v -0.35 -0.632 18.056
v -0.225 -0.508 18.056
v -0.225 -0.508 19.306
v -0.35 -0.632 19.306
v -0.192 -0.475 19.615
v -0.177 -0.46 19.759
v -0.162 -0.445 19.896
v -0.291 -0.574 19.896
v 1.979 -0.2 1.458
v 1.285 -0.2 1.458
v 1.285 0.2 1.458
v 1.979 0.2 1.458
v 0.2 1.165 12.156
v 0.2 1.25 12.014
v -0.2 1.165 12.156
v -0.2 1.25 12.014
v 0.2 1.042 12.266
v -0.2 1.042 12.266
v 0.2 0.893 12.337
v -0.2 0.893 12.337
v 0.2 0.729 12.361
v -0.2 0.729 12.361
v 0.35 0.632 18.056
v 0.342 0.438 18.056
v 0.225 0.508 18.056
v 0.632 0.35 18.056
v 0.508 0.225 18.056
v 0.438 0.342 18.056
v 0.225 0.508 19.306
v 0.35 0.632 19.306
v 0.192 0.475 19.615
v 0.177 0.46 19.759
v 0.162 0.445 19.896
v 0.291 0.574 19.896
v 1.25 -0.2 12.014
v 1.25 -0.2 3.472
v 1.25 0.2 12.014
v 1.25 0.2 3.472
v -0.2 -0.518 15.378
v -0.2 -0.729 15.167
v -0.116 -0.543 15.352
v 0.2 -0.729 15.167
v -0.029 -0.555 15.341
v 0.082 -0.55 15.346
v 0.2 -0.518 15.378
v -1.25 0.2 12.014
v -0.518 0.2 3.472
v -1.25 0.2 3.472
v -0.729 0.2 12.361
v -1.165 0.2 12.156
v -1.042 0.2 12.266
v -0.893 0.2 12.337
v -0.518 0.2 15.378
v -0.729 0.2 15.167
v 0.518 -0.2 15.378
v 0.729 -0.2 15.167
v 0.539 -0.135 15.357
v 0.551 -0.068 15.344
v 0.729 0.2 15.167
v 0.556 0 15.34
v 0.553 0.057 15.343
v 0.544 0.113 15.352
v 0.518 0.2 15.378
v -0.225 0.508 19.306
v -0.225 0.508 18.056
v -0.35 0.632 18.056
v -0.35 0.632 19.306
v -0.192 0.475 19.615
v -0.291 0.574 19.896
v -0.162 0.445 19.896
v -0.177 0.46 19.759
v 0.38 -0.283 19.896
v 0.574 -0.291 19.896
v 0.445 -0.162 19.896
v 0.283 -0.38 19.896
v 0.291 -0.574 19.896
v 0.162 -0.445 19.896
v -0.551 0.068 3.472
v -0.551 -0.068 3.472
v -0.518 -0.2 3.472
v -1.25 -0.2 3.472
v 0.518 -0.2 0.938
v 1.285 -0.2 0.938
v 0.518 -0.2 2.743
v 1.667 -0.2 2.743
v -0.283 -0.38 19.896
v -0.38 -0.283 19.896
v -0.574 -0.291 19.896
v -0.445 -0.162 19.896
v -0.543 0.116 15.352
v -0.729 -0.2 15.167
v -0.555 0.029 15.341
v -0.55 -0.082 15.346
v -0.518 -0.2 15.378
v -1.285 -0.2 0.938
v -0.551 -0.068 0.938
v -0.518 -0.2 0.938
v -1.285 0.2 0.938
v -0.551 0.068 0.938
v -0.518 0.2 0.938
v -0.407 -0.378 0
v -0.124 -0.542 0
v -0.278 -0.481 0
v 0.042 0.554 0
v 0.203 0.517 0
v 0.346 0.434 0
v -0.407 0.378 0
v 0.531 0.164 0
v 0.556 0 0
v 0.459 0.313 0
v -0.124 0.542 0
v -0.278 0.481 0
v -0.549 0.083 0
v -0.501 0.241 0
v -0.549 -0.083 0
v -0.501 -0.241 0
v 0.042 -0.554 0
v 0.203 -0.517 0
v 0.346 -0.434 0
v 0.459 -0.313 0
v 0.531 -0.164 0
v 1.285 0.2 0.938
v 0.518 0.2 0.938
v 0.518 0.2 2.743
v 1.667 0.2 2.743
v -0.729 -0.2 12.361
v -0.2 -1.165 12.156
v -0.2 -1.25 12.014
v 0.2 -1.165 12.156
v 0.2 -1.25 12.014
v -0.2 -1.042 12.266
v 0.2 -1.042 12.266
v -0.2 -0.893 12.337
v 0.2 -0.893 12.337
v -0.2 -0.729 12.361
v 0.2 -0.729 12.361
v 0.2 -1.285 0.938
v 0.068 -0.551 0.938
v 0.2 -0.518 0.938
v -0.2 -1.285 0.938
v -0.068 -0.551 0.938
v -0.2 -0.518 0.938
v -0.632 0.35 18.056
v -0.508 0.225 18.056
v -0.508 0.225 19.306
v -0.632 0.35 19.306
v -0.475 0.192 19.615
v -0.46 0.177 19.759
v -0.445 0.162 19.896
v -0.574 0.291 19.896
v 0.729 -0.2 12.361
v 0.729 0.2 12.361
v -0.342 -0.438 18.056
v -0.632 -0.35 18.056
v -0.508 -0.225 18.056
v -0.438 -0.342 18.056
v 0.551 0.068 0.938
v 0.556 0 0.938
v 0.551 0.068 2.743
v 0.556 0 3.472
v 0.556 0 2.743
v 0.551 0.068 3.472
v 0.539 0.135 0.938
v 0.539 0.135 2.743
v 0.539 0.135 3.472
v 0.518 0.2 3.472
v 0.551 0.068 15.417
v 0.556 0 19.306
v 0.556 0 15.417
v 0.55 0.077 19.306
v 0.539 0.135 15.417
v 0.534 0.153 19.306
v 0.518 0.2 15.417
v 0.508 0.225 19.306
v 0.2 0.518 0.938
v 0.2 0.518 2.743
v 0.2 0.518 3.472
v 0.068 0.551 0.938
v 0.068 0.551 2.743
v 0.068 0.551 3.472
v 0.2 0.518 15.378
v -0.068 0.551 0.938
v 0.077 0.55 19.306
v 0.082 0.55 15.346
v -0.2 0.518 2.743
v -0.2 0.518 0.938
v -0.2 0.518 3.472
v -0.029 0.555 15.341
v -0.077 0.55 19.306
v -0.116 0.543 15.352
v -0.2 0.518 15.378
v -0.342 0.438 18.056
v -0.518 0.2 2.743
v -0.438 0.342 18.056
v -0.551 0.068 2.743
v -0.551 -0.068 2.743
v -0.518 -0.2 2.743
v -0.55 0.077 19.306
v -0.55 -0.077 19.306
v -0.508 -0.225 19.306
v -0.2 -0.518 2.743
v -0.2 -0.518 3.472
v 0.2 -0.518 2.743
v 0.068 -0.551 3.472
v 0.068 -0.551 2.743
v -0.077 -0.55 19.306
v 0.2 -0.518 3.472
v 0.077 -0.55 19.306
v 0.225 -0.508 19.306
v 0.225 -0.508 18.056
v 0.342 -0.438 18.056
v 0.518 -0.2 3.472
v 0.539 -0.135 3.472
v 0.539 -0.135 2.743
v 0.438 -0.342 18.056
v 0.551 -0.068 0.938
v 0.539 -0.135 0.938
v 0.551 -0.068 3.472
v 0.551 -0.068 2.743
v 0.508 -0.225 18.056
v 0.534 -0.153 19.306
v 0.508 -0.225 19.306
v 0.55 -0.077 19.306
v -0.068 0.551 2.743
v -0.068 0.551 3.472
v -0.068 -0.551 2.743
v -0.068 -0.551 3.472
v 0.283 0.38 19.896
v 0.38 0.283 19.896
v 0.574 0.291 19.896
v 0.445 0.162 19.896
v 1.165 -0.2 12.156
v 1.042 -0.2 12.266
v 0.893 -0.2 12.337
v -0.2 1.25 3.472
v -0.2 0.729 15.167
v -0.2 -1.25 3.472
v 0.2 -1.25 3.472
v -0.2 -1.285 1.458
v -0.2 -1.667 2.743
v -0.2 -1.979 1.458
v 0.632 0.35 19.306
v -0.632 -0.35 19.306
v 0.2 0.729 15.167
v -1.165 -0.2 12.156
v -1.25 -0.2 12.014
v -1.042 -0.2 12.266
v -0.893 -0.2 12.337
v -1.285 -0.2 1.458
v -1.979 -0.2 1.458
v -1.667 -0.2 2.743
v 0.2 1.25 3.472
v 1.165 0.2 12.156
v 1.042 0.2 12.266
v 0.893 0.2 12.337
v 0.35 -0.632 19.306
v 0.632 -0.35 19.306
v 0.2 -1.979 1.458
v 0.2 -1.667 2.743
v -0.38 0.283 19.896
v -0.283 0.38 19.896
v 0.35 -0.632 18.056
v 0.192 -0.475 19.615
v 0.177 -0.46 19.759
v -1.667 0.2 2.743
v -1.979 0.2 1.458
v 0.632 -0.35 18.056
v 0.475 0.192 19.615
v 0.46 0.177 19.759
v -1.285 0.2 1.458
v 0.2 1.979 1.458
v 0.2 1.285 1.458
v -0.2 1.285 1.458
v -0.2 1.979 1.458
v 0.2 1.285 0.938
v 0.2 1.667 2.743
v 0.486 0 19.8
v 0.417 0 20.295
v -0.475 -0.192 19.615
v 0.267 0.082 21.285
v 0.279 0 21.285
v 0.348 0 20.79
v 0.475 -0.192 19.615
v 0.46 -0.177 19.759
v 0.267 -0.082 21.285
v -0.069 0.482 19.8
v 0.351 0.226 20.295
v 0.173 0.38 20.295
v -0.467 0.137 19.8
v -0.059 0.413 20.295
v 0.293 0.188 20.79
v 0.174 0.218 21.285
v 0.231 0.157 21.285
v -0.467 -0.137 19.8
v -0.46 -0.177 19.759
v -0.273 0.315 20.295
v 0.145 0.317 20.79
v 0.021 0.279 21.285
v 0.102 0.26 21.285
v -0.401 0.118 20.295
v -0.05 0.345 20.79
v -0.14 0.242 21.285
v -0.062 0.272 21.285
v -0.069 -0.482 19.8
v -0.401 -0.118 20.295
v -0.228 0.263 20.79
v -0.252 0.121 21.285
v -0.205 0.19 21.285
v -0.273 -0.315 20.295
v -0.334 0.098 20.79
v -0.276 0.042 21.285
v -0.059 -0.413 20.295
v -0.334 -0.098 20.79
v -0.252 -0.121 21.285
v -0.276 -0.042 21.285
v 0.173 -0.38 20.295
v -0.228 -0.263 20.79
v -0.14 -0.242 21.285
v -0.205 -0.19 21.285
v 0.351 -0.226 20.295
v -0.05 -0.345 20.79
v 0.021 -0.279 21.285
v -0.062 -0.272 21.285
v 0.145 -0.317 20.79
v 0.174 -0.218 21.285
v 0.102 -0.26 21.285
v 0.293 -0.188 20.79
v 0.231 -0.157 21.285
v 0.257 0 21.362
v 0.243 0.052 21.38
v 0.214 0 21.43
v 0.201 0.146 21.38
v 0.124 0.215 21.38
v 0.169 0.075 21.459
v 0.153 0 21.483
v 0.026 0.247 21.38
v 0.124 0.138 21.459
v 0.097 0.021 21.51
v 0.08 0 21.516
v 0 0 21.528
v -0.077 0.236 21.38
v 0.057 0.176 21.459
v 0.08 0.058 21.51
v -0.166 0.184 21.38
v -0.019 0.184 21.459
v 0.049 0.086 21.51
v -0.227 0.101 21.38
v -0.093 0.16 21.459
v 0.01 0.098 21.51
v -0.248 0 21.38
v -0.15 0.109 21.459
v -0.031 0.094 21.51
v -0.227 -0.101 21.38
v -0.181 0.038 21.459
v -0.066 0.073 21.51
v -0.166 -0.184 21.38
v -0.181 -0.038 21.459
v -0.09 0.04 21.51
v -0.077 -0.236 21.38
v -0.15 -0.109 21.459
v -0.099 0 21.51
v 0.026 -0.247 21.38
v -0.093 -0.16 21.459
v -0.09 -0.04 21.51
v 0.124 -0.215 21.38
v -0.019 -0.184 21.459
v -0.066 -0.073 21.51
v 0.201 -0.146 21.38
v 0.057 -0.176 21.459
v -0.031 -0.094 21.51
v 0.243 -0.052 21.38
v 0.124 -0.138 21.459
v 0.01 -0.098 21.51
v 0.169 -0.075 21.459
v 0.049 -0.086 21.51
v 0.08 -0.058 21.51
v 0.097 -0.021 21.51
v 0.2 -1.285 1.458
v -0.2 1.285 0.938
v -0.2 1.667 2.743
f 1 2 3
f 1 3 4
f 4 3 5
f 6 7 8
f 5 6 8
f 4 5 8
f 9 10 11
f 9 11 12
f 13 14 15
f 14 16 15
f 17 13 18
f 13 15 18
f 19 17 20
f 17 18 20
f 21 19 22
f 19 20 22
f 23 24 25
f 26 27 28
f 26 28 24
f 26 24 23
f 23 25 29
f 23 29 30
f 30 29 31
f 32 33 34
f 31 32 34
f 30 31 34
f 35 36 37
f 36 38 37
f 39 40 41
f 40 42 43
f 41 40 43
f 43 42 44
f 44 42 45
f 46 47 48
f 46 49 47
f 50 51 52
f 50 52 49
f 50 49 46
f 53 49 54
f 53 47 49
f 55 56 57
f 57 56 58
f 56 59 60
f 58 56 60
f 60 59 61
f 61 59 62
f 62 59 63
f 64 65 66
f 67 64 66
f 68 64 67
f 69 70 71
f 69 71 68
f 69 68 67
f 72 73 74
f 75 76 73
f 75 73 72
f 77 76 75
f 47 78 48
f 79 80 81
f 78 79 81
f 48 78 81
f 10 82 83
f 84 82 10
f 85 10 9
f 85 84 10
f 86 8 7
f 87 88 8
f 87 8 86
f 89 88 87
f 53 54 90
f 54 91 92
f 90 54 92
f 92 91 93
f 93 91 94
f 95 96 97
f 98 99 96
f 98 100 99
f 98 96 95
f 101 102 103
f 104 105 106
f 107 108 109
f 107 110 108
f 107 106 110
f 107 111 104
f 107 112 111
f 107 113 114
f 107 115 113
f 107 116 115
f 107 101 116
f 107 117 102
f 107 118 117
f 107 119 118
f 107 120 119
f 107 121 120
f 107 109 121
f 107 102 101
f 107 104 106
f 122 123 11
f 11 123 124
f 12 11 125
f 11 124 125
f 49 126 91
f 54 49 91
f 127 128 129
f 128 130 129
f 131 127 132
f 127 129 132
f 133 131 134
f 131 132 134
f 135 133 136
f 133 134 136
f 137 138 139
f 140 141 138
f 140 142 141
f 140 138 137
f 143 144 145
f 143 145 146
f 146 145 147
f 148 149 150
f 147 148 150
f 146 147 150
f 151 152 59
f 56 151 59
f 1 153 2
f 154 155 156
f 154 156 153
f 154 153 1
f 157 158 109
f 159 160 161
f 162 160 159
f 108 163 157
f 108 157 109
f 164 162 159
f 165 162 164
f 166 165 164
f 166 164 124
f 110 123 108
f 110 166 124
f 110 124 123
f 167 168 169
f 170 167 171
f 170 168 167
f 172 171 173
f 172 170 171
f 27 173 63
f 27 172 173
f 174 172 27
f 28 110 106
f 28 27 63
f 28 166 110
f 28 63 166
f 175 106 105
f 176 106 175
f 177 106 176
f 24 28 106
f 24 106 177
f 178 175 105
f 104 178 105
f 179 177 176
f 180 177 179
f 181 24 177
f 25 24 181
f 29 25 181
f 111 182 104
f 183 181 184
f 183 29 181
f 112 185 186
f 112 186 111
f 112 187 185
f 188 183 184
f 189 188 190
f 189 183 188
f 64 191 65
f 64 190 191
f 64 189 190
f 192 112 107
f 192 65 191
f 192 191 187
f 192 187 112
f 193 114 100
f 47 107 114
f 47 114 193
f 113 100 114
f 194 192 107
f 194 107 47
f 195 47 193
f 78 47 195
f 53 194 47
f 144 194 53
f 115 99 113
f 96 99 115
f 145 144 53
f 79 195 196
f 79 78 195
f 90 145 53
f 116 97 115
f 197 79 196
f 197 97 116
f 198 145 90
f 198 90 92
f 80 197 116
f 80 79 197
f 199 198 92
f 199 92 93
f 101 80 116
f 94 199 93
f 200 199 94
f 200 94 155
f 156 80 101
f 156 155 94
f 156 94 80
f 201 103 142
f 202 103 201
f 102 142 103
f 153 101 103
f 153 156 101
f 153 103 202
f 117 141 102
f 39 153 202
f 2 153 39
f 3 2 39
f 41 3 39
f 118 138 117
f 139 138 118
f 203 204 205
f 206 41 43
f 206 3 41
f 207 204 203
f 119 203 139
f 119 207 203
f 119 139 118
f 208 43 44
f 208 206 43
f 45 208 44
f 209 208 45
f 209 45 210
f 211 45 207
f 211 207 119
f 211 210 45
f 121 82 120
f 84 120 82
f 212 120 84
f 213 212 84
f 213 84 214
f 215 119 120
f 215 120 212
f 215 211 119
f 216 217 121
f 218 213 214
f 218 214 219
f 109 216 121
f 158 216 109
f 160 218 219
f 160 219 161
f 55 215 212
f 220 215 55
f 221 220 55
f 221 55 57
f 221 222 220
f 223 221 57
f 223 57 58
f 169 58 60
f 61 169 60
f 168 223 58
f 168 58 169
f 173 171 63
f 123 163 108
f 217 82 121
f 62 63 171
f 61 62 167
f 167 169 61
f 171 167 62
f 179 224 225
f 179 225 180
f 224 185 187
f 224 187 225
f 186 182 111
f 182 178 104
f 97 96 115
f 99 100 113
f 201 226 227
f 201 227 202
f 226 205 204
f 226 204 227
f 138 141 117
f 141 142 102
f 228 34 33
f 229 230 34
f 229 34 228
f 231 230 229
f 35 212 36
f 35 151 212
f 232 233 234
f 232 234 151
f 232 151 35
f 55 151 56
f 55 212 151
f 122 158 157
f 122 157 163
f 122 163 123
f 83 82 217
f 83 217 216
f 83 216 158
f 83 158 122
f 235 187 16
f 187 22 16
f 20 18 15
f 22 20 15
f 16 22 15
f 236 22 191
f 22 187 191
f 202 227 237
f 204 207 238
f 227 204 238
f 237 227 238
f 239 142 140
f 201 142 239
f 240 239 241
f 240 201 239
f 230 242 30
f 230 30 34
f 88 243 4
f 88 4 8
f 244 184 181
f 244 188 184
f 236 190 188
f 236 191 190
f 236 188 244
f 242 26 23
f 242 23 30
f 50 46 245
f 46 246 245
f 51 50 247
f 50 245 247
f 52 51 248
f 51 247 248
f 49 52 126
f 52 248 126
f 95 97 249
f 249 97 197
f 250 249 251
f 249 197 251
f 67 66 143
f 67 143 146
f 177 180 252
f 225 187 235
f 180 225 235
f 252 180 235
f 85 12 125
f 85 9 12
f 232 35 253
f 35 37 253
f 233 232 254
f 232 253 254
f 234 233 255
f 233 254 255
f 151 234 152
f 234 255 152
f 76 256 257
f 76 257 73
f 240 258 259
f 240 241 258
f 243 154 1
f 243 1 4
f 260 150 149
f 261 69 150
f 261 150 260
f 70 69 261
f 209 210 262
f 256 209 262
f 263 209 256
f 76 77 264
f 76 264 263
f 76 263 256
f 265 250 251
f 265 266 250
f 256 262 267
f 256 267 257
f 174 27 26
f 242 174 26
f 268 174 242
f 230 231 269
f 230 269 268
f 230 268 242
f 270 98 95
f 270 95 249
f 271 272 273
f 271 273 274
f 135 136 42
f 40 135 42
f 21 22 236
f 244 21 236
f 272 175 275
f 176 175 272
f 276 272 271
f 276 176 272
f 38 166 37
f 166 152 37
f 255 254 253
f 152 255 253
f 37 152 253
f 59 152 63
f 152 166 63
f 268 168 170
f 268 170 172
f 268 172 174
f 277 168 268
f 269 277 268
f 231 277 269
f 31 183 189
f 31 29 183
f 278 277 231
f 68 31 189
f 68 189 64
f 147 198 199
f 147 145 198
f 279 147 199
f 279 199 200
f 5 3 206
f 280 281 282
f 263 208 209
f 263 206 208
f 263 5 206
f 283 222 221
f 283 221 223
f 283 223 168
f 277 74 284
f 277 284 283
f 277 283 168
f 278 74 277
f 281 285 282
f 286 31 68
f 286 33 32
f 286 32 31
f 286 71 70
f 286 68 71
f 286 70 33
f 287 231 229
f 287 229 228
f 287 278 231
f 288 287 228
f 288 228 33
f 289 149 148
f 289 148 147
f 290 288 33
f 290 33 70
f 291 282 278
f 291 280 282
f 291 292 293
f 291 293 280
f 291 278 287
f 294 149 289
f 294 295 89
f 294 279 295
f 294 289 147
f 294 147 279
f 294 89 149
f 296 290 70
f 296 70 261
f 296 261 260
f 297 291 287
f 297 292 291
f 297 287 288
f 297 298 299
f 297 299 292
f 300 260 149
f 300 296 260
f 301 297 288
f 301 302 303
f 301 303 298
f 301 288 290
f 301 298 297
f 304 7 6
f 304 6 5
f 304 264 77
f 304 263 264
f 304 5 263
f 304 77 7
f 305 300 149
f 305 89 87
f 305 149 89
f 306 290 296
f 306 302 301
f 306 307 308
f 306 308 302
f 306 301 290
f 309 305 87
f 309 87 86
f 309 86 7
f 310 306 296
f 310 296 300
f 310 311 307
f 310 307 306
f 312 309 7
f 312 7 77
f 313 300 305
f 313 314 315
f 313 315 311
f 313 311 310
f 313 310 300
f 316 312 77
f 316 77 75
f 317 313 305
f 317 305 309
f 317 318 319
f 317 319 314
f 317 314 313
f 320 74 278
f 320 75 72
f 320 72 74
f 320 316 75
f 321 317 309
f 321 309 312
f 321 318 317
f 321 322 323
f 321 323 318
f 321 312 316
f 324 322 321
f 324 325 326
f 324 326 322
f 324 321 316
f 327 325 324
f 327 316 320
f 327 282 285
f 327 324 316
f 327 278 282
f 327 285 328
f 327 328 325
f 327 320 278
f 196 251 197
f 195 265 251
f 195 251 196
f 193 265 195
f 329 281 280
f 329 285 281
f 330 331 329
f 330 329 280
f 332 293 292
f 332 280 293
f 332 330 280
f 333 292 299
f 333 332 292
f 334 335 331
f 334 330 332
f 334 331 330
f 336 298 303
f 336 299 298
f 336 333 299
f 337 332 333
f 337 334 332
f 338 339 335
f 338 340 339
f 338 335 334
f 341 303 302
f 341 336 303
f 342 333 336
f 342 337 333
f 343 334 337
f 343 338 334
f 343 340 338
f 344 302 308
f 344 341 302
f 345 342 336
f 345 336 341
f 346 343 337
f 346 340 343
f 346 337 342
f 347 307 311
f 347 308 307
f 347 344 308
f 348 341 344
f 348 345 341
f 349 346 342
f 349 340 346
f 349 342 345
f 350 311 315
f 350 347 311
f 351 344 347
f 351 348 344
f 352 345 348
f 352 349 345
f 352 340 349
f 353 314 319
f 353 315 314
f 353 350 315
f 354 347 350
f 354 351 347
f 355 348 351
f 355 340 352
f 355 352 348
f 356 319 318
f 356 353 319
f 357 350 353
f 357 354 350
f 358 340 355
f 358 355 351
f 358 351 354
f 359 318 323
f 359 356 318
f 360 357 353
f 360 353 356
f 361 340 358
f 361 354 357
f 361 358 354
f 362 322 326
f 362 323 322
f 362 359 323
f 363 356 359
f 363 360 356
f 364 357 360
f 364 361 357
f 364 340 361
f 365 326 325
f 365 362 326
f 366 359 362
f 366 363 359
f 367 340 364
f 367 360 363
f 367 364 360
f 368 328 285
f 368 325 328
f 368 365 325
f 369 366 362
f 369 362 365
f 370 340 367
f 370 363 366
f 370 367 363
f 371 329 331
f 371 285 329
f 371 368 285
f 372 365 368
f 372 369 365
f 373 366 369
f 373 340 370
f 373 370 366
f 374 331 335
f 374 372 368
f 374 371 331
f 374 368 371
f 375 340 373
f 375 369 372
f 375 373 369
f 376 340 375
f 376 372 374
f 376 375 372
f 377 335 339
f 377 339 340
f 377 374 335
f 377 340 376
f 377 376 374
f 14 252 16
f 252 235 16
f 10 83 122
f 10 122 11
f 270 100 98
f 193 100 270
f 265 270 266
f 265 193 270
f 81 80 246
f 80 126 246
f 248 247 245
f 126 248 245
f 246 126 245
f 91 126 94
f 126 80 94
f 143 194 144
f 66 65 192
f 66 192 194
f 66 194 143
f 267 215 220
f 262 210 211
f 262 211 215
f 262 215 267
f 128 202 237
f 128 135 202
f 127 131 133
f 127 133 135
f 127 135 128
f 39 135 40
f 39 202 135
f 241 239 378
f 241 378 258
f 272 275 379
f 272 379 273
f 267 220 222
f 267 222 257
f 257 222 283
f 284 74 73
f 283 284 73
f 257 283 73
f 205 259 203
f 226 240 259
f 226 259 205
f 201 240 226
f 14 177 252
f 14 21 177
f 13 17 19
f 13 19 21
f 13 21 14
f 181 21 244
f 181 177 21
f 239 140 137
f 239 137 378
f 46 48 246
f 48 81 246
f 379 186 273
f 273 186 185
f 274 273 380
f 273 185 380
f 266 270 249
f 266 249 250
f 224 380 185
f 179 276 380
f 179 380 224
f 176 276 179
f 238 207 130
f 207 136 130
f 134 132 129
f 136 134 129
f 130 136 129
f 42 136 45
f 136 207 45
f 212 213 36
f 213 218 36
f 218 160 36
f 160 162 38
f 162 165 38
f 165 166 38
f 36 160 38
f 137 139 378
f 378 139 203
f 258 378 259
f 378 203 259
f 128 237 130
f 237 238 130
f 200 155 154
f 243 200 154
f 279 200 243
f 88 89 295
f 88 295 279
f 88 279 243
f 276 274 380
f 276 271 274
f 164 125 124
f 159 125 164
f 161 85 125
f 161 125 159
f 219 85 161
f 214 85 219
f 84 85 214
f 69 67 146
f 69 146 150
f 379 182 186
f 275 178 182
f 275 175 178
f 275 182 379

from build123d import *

# Parameters (mm, degrees)
F3_DEPTH     = 0.2
F6_DEPTH     = 0.2
F7_COUNT     = 4
F8_T4_DEPTH  = 1.685841494
F8_S5_R      = 0.5555555556
F8_T6_DEPTH  = 2
F8_T10_DEPTH = 1.685841494
F8_S11_R     = 0.5555555556
F8_T12_DEPTH = 2
F8_T16_DEPTH = 1.685841494
F8_S17_R     = 0.5555555556
F8_T18_DEPTH = 2
F8_T22_DEPTH = 1.685841494
F8_S23_R     = 0.5555555556
F8_T24_DEPTH = 2


# Not quite as in the source:
# - a fillet or chamfer that OpenCascade refuses, or shapes differently, is made with other operations: its cross-section is extruded or revolved along the edge and cut away or added
# - a feature names something its author has since deleted; it is built from what else it names


with BuildPart() as f1:
    # F0 (on Front) → F1 (revolve)
    with BuildSketch(Plane.XZ):
        with BuildLine():
            Line((0, 21.5277777778), (0, 0))
            Line((0, 0), (0.5555555556, 0))
            Line((0.5555555556, 0), (0.5555555556, 19.3055555556))
            Line((0.5555555556, 19.3055555556), (0.2793333296, 21.2847222222))
            ThreePointArc((0.2793333296, 21.2847222222), (0.185137187, 21.4585073218), (0, 21.5277777778))
        make_face()
    revolve(axis=Axis((0, 0, 10.7638888889), (0, 0, 1)))

    # F2 (on Front) → F3 (join, symmetric)
    with BuildSketch(Plane.XZ):
        with BuildLine():
            Line((0, 15.4166666667), (0, 3.4722222222))
            Line((0, 3.4722222222), (1.25, 3.4722222222))
            Line((1.25, 3.4722222222), (1.25, 12.0138888889))
            ThreePointArc((1.25, 12.0138888889), (1.0421485482, 12.2663478223), (0.7291666667, 12.3611111111))
            Line((0.7291666667, 12.3611111111), (0.7291666667, 15.4166666667))
            Line((0.7291666667, 15.4166666667), (0, 15.4166666667))
        make_face()
        Polygon((0, 2.7430555556), (0, 0.9375), (1.2847222222, 0.9375), (1.2847222222, 1.4583333333), (1.9791666667, 1.4583333333), (1.6666666667, 2.7430555556), align=None)
    extrude(amount=F3_DEPTH, both=True)

    # F5 (on face) → F6 (join, symmetric)
    with BuildSketch(Plane(origin=(0, 0, 0), x_dir=(0.7071067812, -0.7071067812, 0), z_dir=(-0.7071067812, -0.7071067812, 0))):
        Polygon((0, 19.3055555556), (0, 18.0555555556), (0.6944444444, 18.0555555556), (0.6944444444, 19.3055555556), (0.612062377, 19.8958333333), (0, 19.8958333333), align=None)
    extrude(amount=F6_DEPTH, both=True)

    # F7: F1 ×4 about axis
    f7_axis = Axis((0, 0, 0), (0, 0, 1))


with BuildPart() as f1_1:
    add(f1.part)
    for i in range(1, F7_COUNT):
        add(f1.part.rotate(f7_axis, i * 360 / F7_COUNT))

    # F8: chamfer of 0.25 on 4 edges, made by hand


with BuildPart() as f8_tool2:
    # F8_s3 → F8_t4 (new body)
    with BuildSketch(Plane.XZ.offset(0.842920747)):
        Polygon((-0.7291666667, 15.1666666667), (-0.4791666667, 15.4166666667), (-0.7291666667, 15.4166666667), align=None)
    extrude(amount=-F8_T4_DEPTH)

    # F8_s5 → F8_t6 (cut, symmetric)
    with BuildSketch(Plane.XY.offset(15.3)):
        Circle(F8_S5_R)
    extrude(amount=F8_T6_DEPTH, both=True, mode=Mode.SUBTRACT)


with BuildPart() as f1_2:
    add(f1_1.part)

    # F8_t1: cut F8_tool2
    add(f8_tool2.part, mode=Mode.SUBTRACT)


with BuildPart() as f8_tool8:
    # F8_s9 → F8_t10 (new body)
    with BuildSketch(Plane.YZ.offset(0.842920747)):
        Polygon((-0.7291666667, 15.1666666667), (-0.4791666667, 15.4166666667), (-0.7291666667, 15.4166666667), align=None)
    extrude(amount=-F8_T10_DEPTH)

    # F8_s11 → F8_t12 (cut, symmetric)
    with BuildSketch(Plane.XY.offset(15.3)):
        Circle(F8_S11_R)
    extrude(amount=F8_T12_DEPTH, both=True, mode=Mode.SUBTRACT)


with BuildPart() as f1_3:
    add(f1_2.part)

    # F8_t7: cut F8_tool8
    add(f8_tool8.part, mode=Mode.SUBTRACT)


with BuildPart() as f8_tool14:
    # F8_s15 → F8_t16 (new body)
    with BuildSketch(Plane.XZ.offset(-0.842920747)):
        Polygon((0.7291666667, 15.1666666667), (0.4791666667, 15.4166666667), (0.7291666667, 15.4166666667), align=None)
    extrude(amount=F8_T16_DEPTH)

    # F8_s17 → F8_t18 (cut, symmetric)
    with BuildSketch(Plane.XY.offset(15.3)):
        Circle(F8_S17_R)
    extrude(amount=F8_T18_DEPTH, both=True, mode=Mode.SUBTRACT)


with BuildPart() as f1_4:
    add(f1_3.part)

    # F8_t13: cut F8_tool14
    add(f8_tool14.part, mode=Mode.SUBTRACT)


with BuildPart() as f8_tool20:
    # F8_s21 → F8_t22 (new body)
    with BuildSketch(Plane.YZ.offset(-0.842920747)):
        Polygon((0.4791666667, 15.4166666667), (0.7291666667, 15.1666666667), (0.7291666667, 15.4166666667), align=None)
    extrude(amount=F8_T22_DEPTH)

    # F8_s23 → F8_t24 (cut, symmetric)
    with BuildSketch(Plane.XY.offset(15.3)):
        Circle(F8_S23_R)
    extrude(amount=F8_T24_DEPTH, both=True, mode=Mode.SUBTRACT)


with BuildPart() as f1_5:
    add(f1_4.part)

    # F8_t19: cut F8_tool20
    add(f8_tool20.part, mode=Mode.SUBTRACT)


solid = f1_5.part
